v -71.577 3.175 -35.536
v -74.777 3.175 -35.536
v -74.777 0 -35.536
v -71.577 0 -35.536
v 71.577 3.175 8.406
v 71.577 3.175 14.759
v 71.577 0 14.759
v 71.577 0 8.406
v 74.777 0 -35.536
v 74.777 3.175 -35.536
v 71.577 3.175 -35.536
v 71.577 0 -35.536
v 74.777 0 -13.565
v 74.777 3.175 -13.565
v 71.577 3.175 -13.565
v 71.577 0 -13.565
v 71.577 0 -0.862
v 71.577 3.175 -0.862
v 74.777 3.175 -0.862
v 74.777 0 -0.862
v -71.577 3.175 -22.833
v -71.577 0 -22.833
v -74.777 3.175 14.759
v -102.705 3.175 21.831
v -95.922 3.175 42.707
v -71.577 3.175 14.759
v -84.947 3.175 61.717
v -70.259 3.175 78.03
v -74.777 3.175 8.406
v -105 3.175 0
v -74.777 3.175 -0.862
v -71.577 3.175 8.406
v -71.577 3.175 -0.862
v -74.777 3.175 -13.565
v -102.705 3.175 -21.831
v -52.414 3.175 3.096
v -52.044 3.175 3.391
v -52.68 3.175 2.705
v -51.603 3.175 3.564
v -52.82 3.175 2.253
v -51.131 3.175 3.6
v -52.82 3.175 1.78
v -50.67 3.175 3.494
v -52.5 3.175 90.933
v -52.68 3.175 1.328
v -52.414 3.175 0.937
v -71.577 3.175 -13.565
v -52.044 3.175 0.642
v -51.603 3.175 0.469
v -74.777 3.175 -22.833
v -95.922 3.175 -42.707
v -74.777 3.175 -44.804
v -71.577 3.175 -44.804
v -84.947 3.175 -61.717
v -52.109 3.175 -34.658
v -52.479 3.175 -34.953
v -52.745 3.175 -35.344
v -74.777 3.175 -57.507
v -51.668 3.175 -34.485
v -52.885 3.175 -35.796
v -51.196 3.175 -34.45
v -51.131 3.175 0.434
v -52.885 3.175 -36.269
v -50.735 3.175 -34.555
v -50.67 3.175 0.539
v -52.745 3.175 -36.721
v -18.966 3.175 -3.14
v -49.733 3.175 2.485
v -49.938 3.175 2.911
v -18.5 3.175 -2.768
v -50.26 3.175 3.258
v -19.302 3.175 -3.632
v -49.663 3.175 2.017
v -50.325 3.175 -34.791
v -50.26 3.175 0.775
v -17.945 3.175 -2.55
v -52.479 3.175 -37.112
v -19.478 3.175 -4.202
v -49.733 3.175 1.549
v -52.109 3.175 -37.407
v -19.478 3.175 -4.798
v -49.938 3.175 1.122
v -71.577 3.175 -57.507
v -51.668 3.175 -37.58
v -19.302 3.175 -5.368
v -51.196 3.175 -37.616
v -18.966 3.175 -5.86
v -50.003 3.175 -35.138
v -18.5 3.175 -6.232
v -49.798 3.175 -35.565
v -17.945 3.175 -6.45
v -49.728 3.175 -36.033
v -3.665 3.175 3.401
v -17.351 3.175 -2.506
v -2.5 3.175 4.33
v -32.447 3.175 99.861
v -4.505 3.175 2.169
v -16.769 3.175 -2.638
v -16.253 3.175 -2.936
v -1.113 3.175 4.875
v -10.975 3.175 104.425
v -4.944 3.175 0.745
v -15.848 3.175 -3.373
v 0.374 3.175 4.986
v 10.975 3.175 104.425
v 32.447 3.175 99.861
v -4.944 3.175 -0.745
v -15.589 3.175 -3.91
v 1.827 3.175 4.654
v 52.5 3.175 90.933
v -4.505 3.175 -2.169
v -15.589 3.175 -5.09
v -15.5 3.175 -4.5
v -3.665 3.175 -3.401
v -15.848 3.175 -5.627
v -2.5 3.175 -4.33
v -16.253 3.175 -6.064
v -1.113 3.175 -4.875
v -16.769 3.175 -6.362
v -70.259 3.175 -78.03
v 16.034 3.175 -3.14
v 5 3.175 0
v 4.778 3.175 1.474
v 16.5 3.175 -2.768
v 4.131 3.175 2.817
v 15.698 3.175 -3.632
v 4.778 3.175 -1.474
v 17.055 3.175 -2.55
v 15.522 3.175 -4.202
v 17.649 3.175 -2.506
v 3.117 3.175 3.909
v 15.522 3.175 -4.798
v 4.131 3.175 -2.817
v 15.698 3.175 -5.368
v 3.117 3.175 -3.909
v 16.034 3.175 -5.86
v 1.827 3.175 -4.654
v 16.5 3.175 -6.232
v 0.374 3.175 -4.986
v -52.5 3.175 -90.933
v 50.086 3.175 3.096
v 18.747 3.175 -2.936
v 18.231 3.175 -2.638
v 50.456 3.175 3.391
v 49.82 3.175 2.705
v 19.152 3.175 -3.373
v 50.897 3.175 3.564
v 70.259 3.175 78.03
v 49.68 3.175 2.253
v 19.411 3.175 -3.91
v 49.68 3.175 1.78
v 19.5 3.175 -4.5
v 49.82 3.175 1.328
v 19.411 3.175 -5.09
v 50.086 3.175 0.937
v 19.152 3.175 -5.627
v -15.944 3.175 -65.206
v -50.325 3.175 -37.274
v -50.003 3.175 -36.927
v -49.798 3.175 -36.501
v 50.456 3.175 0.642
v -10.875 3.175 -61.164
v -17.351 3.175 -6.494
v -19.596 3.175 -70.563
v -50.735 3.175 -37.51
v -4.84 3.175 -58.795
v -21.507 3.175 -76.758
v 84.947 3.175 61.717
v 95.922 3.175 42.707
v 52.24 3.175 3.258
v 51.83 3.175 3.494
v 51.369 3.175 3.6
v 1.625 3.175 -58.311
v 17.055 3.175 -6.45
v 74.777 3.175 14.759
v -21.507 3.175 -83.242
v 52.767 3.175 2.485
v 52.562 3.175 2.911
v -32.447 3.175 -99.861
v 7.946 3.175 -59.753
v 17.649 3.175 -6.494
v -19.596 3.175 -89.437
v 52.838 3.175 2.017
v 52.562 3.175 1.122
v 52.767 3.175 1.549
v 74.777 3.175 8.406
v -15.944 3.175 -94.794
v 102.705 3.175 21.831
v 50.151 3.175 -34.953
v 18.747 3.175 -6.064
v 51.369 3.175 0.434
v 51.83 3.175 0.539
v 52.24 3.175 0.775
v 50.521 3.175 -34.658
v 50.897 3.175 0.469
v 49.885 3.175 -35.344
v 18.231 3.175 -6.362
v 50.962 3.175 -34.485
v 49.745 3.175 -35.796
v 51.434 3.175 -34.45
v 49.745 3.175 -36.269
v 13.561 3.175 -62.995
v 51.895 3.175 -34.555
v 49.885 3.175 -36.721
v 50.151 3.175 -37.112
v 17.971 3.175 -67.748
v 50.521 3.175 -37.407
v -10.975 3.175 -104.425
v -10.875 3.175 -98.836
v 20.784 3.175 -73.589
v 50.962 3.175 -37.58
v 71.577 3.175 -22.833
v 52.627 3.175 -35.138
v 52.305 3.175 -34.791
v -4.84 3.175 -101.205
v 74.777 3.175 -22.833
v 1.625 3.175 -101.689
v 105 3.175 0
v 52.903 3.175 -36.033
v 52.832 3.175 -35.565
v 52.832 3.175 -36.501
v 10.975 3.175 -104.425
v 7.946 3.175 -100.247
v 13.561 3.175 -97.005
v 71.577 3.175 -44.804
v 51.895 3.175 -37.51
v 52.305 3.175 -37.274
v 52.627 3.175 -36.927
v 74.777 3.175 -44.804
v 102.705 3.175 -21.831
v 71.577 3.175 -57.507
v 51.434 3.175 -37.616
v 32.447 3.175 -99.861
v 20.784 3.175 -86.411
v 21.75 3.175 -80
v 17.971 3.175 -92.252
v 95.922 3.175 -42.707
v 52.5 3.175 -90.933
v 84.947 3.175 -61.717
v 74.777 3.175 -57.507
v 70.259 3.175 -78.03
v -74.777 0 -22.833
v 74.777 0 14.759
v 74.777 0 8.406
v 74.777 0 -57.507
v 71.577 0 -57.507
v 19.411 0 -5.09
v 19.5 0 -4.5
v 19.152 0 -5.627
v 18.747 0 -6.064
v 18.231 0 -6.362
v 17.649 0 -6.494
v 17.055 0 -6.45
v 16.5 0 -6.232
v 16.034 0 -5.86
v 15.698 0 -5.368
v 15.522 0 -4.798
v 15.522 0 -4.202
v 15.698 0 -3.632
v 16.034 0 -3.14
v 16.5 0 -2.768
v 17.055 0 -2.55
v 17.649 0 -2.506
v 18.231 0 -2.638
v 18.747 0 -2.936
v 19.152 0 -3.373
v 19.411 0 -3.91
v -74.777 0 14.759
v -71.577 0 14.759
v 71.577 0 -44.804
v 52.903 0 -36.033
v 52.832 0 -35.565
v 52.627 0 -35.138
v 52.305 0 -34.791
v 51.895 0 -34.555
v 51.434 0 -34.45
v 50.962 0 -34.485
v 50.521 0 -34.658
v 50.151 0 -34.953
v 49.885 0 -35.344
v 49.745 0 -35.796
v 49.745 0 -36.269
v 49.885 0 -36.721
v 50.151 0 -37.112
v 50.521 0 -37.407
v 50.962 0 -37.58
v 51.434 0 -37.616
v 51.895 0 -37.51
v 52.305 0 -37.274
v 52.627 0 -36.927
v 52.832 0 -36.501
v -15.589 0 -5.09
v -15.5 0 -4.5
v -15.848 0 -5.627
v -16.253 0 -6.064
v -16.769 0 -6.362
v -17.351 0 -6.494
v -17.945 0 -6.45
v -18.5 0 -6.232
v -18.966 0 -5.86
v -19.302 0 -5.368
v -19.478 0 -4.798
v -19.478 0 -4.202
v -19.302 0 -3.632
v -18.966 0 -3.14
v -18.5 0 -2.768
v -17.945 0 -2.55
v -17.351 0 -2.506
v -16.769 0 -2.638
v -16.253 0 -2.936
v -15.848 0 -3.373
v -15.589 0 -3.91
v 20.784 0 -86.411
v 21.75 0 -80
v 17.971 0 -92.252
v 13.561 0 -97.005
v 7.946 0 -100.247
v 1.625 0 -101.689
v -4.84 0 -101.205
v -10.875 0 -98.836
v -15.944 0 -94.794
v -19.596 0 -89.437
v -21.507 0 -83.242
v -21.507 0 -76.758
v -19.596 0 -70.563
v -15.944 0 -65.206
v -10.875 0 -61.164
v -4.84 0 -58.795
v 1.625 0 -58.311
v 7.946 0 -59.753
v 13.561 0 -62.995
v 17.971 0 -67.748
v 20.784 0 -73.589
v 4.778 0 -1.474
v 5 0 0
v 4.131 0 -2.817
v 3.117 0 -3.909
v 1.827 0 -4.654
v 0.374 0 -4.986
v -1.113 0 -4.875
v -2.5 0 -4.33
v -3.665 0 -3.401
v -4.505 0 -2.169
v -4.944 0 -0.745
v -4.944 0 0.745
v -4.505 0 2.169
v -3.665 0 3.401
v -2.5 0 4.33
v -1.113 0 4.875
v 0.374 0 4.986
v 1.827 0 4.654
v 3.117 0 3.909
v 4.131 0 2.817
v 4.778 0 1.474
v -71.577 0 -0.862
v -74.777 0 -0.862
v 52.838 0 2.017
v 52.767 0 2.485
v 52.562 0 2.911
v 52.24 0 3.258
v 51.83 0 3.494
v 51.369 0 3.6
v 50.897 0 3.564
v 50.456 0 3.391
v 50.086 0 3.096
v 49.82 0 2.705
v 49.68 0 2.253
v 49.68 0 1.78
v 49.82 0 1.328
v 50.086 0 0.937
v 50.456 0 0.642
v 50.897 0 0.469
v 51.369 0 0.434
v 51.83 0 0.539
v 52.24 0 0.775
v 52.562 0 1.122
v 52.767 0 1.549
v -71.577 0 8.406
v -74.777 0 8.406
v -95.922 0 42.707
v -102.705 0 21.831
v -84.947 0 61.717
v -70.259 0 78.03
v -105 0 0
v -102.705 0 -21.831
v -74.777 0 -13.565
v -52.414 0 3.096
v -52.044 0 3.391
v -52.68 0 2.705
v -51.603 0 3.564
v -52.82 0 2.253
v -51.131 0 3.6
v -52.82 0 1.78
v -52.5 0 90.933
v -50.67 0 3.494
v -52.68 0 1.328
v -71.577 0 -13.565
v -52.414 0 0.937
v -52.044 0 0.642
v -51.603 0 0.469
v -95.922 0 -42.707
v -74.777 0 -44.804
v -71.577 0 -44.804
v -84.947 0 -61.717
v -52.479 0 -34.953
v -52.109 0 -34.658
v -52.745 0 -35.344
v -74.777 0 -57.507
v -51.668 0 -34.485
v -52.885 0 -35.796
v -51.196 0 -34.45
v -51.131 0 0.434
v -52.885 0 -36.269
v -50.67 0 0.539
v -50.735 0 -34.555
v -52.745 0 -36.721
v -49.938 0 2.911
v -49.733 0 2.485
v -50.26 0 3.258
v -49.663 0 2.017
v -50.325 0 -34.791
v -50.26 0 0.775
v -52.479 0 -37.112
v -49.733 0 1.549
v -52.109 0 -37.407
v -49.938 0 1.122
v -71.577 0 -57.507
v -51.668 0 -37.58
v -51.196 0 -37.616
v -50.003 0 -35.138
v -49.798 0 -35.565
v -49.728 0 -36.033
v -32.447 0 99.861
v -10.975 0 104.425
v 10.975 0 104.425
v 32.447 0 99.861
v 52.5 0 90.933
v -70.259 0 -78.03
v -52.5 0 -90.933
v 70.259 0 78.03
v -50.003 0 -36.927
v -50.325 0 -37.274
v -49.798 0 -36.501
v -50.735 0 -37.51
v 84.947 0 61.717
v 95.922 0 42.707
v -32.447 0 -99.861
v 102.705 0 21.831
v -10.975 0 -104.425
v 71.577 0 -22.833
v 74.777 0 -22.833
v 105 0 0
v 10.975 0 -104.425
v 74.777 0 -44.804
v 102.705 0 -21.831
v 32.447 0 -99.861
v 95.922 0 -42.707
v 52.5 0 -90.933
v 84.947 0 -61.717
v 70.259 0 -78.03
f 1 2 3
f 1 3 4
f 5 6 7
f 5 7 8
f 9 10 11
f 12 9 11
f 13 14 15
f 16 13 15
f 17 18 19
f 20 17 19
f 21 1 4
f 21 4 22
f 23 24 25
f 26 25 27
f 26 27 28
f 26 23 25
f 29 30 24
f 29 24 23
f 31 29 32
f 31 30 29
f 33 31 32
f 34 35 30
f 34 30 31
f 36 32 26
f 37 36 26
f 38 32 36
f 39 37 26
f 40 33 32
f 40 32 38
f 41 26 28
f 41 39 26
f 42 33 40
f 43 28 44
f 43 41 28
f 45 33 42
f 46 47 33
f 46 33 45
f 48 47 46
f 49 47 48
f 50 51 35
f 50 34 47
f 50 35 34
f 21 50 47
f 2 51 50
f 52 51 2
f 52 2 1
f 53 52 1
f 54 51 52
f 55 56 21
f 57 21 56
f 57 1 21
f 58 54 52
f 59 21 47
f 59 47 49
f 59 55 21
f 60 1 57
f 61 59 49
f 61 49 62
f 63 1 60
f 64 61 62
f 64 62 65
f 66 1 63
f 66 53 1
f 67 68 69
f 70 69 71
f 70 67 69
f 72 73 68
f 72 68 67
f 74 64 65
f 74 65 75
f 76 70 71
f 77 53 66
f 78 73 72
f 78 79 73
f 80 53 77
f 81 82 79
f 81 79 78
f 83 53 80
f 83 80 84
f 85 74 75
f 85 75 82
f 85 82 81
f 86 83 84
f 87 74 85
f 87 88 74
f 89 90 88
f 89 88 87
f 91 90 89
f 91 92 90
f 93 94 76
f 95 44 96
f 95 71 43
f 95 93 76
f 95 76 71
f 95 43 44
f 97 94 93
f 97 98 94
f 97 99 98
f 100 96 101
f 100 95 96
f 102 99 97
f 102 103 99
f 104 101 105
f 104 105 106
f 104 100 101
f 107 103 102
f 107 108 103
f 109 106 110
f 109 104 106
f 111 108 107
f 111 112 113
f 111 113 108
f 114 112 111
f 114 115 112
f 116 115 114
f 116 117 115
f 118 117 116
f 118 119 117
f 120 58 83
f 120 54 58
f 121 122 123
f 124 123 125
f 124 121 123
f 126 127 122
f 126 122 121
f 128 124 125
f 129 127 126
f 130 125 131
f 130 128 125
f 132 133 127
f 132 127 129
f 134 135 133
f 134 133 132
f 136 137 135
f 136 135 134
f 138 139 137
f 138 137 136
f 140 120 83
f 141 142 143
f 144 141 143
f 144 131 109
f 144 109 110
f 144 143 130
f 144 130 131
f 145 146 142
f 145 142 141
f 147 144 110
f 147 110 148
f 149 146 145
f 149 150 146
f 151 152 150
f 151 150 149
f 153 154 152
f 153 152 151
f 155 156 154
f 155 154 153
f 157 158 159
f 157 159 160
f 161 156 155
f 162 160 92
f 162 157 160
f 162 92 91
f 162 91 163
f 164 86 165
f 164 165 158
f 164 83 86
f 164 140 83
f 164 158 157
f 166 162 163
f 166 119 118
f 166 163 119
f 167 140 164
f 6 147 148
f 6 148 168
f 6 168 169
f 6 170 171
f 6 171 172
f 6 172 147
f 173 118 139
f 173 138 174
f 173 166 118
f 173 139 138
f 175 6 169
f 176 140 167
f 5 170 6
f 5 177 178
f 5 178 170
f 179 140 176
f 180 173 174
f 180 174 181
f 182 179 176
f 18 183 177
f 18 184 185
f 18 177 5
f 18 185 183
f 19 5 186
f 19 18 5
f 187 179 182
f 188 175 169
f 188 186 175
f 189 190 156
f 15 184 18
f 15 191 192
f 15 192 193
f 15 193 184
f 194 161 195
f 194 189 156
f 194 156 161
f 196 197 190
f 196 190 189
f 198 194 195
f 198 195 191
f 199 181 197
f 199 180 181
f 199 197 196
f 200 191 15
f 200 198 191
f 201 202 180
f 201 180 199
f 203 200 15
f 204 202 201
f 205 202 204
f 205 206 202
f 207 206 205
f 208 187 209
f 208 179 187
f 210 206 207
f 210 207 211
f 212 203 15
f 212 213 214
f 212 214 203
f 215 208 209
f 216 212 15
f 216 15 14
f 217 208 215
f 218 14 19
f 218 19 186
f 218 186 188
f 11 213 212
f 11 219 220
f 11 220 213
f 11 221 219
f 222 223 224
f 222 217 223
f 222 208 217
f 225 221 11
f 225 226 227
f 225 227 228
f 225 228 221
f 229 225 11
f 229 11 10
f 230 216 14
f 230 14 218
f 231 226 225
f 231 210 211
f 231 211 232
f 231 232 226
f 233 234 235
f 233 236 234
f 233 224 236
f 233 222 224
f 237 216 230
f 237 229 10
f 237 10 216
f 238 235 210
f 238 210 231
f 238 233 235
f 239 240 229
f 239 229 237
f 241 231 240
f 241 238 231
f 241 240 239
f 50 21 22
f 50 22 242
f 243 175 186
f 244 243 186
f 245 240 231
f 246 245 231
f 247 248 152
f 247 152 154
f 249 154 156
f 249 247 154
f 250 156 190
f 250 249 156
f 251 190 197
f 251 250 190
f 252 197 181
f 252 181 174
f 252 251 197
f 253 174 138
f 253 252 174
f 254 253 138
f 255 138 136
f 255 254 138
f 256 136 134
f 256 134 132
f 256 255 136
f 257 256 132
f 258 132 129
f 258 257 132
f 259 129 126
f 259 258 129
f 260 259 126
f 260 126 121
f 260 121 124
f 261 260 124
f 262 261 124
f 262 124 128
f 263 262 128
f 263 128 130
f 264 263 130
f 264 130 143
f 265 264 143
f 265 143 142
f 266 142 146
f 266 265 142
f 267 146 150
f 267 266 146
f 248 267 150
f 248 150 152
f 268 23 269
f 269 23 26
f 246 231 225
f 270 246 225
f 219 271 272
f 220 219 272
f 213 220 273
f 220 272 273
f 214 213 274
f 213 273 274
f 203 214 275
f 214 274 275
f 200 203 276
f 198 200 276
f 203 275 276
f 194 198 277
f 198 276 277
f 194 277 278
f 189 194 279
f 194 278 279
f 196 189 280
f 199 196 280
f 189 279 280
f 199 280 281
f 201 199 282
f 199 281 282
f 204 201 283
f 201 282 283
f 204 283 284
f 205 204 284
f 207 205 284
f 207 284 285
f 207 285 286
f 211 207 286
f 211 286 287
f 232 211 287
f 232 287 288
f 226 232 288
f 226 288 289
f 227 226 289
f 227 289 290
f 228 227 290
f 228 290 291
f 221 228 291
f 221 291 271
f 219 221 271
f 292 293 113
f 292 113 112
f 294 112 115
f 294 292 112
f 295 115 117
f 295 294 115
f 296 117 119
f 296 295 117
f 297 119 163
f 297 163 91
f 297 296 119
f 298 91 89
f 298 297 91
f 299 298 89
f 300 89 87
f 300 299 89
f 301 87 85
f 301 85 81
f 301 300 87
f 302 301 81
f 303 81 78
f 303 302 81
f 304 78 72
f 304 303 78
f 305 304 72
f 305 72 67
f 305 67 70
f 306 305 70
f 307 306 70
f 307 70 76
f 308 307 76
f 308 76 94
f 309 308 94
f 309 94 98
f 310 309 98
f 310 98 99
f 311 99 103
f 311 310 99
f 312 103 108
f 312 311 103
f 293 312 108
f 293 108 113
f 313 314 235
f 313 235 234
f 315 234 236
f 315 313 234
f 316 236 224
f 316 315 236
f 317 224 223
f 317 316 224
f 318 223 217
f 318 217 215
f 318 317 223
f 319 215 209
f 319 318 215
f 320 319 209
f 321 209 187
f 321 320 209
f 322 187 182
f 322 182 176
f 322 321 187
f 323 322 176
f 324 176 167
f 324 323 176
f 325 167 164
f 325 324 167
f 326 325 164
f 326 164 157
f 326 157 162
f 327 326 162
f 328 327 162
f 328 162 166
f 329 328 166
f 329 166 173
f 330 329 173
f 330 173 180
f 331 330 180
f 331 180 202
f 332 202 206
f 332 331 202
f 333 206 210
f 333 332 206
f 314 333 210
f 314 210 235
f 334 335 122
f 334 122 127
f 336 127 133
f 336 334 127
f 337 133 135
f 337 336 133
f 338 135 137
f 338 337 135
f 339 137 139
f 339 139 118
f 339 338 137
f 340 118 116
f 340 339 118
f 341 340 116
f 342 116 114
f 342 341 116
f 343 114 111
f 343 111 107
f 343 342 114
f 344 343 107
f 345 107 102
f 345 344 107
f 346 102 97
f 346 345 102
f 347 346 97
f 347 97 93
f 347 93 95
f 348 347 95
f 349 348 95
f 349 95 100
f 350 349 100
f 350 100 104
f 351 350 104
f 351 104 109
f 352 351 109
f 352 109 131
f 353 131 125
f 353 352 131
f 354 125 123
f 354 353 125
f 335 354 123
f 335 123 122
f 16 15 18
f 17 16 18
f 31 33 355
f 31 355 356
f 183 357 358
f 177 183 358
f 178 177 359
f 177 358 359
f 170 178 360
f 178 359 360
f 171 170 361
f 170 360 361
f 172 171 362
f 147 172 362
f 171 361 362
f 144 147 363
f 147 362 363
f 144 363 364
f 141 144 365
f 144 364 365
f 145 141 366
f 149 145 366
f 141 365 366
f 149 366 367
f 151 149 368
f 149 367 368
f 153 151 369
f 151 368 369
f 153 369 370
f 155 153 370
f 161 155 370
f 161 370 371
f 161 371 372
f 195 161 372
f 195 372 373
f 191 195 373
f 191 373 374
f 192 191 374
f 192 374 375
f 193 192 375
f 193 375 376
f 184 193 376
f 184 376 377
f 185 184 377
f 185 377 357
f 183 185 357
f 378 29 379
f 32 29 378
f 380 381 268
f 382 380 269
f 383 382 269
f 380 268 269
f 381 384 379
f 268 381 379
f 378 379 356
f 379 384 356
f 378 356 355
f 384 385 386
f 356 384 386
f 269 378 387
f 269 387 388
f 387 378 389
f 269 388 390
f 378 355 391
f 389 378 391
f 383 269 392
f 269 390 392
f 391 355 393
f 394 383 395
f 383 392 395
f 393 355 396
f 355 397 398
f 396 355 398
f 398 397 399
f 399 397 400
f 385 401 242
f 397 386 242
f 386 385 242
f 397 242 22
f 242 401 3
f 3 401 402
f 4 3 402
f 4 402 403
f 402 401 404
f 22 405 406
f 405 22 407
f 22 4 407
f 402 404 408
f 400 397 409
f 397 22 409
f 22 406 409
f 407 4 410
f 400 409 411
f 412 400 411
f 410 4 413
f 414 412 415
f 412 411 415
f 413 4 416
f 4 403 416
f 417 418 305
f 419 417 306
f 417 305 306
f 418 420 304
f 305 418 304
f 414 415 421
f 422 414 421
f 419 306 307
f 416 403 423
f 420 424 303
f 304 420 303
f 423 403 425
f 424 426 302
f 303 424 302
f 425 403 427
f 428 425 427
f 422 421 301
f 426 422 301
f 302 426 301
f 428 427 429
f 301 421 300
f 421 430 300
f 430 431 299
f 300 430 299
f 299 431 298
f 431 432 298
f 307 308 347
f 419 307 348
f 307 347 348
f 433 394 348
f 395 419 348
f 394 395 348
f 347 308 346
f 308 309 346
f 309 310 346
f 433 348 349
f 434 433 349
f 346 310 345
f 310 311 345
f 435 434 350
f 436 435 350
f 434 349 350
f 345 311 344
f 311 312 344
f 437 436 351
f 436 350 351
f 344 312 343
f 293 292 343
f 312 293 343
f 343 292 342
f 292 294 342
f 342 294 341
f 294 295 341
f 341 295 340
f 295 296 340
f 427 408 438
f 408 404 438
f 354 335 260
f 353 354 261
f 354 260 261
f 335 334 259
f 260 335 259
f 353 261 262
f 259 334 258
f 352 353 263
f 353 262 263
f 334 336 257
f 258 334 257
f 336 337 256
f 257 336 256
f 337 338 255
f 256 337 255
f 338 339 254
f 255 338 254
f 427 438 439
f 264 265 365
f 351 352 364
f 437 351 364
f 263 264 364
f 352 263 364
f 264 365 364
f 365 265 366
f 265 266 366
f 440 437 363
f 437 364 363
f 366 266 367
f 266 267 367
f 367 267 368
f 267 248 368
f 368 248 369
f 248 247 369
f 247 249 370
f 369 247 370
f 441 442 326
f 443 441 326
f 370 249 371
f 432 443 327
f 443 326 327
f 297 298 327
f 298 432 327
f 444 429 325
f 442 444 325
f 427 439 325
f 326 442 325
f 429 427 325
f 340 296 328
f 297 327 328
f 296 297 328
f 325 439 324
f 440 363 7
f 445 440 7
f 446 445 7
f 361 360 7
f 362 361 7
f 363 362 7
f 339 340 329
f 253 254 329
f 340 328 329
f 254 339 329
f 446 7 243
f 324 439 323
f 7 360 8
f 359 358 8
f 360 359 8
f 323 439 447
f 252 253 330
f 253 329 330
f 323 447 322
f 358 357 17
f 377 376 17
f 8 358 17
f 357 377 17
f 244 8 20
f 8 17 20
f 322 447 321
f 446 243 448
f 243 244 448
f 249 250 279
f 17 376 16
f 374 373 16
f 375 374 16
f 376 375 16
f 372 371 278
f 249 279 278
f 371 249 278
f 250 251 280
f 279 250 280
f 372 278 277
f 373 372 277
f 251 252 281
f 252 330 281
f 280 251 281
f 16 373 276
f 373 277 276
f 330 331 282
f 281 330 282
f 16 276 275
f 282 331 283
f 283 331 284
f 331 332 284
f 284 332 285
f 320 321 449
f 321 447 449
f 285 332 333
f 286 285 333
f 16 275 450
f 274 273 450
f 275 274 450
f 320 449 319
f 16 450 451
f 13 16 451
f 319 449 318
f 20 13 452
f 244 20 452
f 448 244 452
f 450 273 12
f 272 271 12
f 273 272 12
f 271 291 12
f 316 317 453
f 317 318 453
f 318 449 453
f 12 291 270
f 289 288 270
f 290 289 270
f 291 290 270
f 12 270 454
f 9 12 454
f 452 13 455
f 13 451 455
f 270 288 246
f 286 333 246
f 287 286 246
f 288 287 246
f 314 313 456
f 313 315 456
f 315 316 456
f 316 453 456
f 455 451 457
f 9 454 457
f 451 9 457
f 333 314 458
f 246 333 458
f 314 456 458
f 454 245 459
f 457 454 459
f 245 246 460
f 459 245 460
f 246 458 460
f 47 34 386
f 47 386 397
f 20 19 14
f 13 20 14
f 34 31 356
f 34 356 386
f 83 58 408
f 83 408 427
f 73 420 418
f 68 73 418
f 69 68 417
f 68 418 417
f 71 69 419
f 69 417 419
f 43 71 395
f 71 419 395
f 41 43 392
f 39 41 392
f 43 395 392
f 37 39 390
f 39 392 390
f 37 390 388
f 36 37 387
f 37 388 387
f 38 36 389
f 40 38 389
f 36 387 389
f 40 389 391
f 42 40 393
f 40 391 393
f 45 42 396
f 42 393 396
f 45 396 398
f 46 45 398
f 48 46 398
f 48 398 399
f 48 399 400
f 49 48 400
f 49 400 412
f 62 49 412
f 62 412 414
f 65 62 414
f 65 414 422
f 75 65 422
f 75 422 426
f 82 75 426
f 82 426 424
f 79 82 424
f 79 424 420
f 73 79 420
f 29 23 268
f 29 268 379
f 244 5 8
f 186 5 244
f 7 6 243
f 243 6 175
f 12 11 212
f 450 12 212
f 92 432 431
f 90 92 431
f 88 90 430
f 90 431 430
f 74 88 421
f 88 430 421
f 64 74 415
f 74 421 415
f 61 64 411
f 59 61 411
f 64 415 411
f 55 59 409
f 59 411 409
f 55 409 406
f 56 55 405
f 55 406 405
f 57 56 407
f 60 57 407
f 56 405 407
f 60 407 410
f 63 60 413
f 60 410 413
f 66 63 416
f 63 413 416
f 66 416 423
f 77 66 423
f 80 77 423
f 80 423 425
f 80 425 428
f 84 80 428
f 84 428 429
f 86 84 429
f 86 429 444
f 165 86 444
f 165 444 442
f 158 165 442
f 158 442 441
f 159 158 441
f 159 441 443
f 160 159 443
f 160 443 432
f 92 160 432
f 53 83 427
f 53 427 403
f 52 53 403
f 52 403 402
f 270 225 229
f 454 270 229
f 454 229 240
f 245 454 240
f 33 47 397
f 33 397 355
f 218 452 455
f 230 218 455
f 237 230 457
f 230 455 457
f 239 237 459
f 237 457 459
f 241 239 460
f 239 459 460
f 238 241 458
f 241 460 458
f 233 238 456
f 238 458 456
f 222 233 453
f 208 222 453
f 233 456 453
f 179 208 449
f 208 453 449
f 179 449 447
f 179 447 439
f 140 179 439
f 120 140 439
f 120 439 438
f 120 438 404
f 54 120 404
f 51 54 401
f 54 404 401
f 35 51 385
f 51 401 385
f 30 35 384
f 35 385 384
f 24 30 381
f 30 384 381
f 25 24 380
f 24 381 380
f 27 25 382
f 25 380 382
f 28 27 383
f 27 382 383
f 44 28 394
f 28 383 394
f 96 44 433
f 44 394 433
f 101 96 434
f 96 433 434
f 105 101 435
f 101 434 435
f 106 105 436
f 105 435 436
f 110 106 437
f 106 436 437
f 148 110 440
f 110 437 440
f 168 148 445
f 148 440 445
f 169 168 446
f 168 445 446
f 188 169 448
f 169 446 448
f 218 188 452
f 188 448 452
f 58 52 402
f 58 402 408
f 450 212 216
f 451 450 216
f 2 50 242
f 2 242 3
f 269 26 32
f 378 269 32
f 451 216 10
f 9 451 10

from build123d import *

# Parameters (mm, degrees)
SKETCH2_R           = 105
SKETCH2_R_2         = 21.75
SKETCH2_R_3         = 5
SKETCH2_R_4         = 2
BOSS_EXTRUDE2_DEPTH = 3.175
SKETCH8_W           = 3.2
SKETCH8_H           = 6.353
CUT_EXTRUDE1_DEPTH  = 4.175
SKETCH9_R           = 1.5875
CUT_EXTRUDE2_DEPTH  = 4.175


with BuildPart() as part:
    # Sketch2 → Boss-Extrude2 (new body)
    with BuildSketch(Plane(origin=(0, 0, 0), x_dir=(1, 0, 0), z_dir=(0, 1, 0))):
        Circle(SKETCH2_R)
        with Locations((0, 80)):
            Circle(SKETCH2_R_2, mode=Mode.SUBTRACT)
        Circle(SKETCH2_R_3, mode=Mode.SUBTRACT)
        with Locations((17.5, 4.5)):
            Circle(SKETCH2_R_4, mode=Mode.SUBTRACT)
        with Locations((-17.5, 4.5)):
            Circle(SKETCH2_R_4, mode=Mode.SUBTRACT)
    extrude(amount=BOSS_EXTRUDE2_DEPTH)

    # Sketch8 → Cut-Extrude1 (cut, through all)
    with BuildSketch(Plane(origin=(0, 3.175, 0), x_dir=(1, 0, 0), z_dir=(0, 1, 0))):
        Polygon((-74.777, 57.507097448), (-71.577, 57.507096503), (-71.577, 44.804096503), (-74.777, 44.804095482), align=None)
        with Locations((73.177, -11.5824036)):
            Rectangle(SKETCH8_W, SKETCH8_H)
        Polygon((-74.777, 35.536096628), (-71.577, 35.536096628), (-71.577, 22.833096628), (-74.777, 22.833096317), align=None)
        Polygon((-74.777, 13.565096577), (-71.577, 13.565096577), (-71.577, 0.862096577), (-74.777, 0.862095696), align=None)
        with Locations((-73.177, -11.5824036)):
            Rectangle(SKETCH8_W, SKETCH8_H)
        Polygon((71.577, 13.565096577), (71.577, 0.862096577), (74.777, 0.862095696), (74.777, 13.565096577), align=None)
        Polygon((71.577, 35.536096628), (71.577, 22.833096628), (74.777, 22.833096317), (74.777, 35.536096628), align=None)
        Polygon((71.577, 57.507096503), (71.577, 44.804096503), (74.777, 44.804095482), (74.777, 57.507097448), align=None)
    extrude(amount=-CUT_EXTRUDE1_DEPTH, mode=Mode.SUBTRACT)

    # Sketch9 → Cut-Extrude2 (cut, through all)
    with BuildSketch(Plane.XZ):
        with Locations((51.250084, 2.0166)):
            Circle(SKETCH9_R)
        with Locations((-51.315116, -36.0326)):
            Circle(SKETCH9_R)
        with Locations((-51.250084, 2.0166)):
            Circle(SKETCH9_R)
        with Locations((51.315116, -36.0326)):
            Circle(SKETCH9_R)
    extrude(amount=-CUT_EXTRUDE2_DEPTH, mode=Mode.SUBTRACT)


solid = part.part
